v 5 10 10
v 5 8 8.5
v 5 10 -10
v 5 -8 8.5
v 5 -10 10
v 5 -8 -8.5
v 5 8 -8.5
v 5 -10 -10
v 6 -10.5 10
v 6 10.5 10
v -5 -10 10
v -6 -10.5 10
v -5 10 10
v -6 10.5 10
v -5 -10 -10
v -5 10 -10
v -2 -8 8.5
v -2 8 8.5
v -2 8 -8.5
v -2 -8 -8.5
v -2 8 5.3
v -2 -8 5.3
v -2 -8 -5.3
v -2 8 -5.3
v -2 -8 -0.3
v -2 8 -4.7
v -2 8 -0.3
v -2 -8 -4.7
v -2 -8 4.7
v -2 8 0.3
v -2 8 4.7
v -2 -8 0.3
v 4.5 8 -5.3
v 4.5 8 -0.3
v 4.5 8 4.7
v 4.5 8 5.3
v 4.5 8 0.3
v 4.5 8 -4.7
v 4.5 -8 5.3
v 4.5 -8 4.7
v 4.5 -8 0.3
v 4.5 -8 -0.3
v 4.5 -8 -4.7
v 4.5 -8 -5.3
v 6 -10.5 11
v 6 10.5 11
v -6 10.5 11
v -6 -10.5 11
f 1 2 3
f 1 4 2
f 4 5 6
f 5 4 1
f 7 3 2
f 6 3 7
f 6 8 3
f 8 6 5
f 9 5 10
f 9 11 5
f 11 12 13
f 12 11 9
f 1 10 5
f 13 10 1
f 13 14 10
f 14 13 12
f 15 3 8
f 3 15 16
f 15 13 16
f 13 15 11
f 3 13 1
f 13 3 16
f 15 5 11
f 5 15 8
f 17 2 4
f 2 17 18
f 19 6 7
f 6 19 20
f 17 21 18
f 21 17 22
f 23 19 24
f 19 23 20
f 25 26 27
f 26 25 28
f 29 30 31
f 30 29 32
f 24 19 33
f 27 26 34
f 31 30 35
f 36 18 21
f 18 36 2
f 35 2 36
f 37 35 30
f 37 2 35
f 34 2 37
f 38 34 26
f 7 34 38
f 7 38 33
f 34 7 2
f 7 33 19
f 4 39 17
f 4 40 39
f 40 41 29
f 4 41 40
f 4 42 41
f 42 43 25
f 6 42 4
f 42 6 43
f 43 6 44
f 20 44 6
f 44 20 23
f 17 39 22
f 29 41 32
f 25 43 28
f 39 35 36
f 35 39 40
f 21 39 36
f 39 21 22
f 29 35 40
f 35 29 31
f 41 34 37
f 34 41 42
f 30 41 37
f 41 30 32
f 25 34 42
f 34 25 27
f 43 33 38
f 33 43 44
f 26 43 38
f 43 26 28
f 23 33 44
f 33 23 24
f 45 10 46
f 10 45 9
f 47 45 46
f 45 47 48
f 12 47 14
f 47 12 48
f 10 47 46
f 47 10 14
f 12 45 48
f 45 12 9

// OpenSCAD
module Bookshelf_02(){

difference(){
color("#bd9476")
cube([10,20,20],center=true);

color("#d5b07c")
translate([2,0,0])
cube([8,16,17],center=true);



}

color("#4f200f")
translate([0.5,0,5])
cube([8,16,0.6],center=true);


color("#4f200f")
translate([0.5,0,-0])
cube([8,16,0.6],center=true);

color("#4f200f")
translate([0.5,0,-5])
cube([8,16,0.6],center=true);


color("#4f200f")
translate([0,0,10.5])
cube([12,21,1],center=true);
}

Bookshelf_02();

 
 // Written by Nicolì Angelo (Gengio) 2024: 
// MIT License


//Permission is hereby granted, free of charge, to any person obtaining a copy of this software and associated documentation files (the "Software"), to deal in the Software without restriction, including without limitation the rights to use, copy, modify, merge, publish, distribute, sublicense, and/or sell copies of the Software, and to permit persons to whom the Software is furnished to do so, subject to the following conditions:

//The above copyright notice and this permission notice shall be included in all copies or substantial portions of the Software.

//THE SOFTWARE IS PROVIDED "AS IS", WITHOUT WARRANTY OF ANY KIND, EXPRESS OR IMPLIED, INCLUDING BUT NOT LIMITED TO THE WARRANTIES OF MERCHANTABILITY, FITNESS FOR A PARTICULAR PURPOSE AND NONINFRINGEMENT. IN NO EVENT SHALL THE AUTHORS OR COPYRIGHT HOLDERS BE LIABLE FOR ANY CLAIM, DAMAGES OR OTHER LIABILITY, WHETHER IN AN ACTION OF CONTRACT, TORT OR OTHERWISE, ARISING FROM, OUT OF OR IN CONNECTION WITH THE SOFTWARE OR THE USE OR OTHER DEALINGS IN THE SOFTWARE.
